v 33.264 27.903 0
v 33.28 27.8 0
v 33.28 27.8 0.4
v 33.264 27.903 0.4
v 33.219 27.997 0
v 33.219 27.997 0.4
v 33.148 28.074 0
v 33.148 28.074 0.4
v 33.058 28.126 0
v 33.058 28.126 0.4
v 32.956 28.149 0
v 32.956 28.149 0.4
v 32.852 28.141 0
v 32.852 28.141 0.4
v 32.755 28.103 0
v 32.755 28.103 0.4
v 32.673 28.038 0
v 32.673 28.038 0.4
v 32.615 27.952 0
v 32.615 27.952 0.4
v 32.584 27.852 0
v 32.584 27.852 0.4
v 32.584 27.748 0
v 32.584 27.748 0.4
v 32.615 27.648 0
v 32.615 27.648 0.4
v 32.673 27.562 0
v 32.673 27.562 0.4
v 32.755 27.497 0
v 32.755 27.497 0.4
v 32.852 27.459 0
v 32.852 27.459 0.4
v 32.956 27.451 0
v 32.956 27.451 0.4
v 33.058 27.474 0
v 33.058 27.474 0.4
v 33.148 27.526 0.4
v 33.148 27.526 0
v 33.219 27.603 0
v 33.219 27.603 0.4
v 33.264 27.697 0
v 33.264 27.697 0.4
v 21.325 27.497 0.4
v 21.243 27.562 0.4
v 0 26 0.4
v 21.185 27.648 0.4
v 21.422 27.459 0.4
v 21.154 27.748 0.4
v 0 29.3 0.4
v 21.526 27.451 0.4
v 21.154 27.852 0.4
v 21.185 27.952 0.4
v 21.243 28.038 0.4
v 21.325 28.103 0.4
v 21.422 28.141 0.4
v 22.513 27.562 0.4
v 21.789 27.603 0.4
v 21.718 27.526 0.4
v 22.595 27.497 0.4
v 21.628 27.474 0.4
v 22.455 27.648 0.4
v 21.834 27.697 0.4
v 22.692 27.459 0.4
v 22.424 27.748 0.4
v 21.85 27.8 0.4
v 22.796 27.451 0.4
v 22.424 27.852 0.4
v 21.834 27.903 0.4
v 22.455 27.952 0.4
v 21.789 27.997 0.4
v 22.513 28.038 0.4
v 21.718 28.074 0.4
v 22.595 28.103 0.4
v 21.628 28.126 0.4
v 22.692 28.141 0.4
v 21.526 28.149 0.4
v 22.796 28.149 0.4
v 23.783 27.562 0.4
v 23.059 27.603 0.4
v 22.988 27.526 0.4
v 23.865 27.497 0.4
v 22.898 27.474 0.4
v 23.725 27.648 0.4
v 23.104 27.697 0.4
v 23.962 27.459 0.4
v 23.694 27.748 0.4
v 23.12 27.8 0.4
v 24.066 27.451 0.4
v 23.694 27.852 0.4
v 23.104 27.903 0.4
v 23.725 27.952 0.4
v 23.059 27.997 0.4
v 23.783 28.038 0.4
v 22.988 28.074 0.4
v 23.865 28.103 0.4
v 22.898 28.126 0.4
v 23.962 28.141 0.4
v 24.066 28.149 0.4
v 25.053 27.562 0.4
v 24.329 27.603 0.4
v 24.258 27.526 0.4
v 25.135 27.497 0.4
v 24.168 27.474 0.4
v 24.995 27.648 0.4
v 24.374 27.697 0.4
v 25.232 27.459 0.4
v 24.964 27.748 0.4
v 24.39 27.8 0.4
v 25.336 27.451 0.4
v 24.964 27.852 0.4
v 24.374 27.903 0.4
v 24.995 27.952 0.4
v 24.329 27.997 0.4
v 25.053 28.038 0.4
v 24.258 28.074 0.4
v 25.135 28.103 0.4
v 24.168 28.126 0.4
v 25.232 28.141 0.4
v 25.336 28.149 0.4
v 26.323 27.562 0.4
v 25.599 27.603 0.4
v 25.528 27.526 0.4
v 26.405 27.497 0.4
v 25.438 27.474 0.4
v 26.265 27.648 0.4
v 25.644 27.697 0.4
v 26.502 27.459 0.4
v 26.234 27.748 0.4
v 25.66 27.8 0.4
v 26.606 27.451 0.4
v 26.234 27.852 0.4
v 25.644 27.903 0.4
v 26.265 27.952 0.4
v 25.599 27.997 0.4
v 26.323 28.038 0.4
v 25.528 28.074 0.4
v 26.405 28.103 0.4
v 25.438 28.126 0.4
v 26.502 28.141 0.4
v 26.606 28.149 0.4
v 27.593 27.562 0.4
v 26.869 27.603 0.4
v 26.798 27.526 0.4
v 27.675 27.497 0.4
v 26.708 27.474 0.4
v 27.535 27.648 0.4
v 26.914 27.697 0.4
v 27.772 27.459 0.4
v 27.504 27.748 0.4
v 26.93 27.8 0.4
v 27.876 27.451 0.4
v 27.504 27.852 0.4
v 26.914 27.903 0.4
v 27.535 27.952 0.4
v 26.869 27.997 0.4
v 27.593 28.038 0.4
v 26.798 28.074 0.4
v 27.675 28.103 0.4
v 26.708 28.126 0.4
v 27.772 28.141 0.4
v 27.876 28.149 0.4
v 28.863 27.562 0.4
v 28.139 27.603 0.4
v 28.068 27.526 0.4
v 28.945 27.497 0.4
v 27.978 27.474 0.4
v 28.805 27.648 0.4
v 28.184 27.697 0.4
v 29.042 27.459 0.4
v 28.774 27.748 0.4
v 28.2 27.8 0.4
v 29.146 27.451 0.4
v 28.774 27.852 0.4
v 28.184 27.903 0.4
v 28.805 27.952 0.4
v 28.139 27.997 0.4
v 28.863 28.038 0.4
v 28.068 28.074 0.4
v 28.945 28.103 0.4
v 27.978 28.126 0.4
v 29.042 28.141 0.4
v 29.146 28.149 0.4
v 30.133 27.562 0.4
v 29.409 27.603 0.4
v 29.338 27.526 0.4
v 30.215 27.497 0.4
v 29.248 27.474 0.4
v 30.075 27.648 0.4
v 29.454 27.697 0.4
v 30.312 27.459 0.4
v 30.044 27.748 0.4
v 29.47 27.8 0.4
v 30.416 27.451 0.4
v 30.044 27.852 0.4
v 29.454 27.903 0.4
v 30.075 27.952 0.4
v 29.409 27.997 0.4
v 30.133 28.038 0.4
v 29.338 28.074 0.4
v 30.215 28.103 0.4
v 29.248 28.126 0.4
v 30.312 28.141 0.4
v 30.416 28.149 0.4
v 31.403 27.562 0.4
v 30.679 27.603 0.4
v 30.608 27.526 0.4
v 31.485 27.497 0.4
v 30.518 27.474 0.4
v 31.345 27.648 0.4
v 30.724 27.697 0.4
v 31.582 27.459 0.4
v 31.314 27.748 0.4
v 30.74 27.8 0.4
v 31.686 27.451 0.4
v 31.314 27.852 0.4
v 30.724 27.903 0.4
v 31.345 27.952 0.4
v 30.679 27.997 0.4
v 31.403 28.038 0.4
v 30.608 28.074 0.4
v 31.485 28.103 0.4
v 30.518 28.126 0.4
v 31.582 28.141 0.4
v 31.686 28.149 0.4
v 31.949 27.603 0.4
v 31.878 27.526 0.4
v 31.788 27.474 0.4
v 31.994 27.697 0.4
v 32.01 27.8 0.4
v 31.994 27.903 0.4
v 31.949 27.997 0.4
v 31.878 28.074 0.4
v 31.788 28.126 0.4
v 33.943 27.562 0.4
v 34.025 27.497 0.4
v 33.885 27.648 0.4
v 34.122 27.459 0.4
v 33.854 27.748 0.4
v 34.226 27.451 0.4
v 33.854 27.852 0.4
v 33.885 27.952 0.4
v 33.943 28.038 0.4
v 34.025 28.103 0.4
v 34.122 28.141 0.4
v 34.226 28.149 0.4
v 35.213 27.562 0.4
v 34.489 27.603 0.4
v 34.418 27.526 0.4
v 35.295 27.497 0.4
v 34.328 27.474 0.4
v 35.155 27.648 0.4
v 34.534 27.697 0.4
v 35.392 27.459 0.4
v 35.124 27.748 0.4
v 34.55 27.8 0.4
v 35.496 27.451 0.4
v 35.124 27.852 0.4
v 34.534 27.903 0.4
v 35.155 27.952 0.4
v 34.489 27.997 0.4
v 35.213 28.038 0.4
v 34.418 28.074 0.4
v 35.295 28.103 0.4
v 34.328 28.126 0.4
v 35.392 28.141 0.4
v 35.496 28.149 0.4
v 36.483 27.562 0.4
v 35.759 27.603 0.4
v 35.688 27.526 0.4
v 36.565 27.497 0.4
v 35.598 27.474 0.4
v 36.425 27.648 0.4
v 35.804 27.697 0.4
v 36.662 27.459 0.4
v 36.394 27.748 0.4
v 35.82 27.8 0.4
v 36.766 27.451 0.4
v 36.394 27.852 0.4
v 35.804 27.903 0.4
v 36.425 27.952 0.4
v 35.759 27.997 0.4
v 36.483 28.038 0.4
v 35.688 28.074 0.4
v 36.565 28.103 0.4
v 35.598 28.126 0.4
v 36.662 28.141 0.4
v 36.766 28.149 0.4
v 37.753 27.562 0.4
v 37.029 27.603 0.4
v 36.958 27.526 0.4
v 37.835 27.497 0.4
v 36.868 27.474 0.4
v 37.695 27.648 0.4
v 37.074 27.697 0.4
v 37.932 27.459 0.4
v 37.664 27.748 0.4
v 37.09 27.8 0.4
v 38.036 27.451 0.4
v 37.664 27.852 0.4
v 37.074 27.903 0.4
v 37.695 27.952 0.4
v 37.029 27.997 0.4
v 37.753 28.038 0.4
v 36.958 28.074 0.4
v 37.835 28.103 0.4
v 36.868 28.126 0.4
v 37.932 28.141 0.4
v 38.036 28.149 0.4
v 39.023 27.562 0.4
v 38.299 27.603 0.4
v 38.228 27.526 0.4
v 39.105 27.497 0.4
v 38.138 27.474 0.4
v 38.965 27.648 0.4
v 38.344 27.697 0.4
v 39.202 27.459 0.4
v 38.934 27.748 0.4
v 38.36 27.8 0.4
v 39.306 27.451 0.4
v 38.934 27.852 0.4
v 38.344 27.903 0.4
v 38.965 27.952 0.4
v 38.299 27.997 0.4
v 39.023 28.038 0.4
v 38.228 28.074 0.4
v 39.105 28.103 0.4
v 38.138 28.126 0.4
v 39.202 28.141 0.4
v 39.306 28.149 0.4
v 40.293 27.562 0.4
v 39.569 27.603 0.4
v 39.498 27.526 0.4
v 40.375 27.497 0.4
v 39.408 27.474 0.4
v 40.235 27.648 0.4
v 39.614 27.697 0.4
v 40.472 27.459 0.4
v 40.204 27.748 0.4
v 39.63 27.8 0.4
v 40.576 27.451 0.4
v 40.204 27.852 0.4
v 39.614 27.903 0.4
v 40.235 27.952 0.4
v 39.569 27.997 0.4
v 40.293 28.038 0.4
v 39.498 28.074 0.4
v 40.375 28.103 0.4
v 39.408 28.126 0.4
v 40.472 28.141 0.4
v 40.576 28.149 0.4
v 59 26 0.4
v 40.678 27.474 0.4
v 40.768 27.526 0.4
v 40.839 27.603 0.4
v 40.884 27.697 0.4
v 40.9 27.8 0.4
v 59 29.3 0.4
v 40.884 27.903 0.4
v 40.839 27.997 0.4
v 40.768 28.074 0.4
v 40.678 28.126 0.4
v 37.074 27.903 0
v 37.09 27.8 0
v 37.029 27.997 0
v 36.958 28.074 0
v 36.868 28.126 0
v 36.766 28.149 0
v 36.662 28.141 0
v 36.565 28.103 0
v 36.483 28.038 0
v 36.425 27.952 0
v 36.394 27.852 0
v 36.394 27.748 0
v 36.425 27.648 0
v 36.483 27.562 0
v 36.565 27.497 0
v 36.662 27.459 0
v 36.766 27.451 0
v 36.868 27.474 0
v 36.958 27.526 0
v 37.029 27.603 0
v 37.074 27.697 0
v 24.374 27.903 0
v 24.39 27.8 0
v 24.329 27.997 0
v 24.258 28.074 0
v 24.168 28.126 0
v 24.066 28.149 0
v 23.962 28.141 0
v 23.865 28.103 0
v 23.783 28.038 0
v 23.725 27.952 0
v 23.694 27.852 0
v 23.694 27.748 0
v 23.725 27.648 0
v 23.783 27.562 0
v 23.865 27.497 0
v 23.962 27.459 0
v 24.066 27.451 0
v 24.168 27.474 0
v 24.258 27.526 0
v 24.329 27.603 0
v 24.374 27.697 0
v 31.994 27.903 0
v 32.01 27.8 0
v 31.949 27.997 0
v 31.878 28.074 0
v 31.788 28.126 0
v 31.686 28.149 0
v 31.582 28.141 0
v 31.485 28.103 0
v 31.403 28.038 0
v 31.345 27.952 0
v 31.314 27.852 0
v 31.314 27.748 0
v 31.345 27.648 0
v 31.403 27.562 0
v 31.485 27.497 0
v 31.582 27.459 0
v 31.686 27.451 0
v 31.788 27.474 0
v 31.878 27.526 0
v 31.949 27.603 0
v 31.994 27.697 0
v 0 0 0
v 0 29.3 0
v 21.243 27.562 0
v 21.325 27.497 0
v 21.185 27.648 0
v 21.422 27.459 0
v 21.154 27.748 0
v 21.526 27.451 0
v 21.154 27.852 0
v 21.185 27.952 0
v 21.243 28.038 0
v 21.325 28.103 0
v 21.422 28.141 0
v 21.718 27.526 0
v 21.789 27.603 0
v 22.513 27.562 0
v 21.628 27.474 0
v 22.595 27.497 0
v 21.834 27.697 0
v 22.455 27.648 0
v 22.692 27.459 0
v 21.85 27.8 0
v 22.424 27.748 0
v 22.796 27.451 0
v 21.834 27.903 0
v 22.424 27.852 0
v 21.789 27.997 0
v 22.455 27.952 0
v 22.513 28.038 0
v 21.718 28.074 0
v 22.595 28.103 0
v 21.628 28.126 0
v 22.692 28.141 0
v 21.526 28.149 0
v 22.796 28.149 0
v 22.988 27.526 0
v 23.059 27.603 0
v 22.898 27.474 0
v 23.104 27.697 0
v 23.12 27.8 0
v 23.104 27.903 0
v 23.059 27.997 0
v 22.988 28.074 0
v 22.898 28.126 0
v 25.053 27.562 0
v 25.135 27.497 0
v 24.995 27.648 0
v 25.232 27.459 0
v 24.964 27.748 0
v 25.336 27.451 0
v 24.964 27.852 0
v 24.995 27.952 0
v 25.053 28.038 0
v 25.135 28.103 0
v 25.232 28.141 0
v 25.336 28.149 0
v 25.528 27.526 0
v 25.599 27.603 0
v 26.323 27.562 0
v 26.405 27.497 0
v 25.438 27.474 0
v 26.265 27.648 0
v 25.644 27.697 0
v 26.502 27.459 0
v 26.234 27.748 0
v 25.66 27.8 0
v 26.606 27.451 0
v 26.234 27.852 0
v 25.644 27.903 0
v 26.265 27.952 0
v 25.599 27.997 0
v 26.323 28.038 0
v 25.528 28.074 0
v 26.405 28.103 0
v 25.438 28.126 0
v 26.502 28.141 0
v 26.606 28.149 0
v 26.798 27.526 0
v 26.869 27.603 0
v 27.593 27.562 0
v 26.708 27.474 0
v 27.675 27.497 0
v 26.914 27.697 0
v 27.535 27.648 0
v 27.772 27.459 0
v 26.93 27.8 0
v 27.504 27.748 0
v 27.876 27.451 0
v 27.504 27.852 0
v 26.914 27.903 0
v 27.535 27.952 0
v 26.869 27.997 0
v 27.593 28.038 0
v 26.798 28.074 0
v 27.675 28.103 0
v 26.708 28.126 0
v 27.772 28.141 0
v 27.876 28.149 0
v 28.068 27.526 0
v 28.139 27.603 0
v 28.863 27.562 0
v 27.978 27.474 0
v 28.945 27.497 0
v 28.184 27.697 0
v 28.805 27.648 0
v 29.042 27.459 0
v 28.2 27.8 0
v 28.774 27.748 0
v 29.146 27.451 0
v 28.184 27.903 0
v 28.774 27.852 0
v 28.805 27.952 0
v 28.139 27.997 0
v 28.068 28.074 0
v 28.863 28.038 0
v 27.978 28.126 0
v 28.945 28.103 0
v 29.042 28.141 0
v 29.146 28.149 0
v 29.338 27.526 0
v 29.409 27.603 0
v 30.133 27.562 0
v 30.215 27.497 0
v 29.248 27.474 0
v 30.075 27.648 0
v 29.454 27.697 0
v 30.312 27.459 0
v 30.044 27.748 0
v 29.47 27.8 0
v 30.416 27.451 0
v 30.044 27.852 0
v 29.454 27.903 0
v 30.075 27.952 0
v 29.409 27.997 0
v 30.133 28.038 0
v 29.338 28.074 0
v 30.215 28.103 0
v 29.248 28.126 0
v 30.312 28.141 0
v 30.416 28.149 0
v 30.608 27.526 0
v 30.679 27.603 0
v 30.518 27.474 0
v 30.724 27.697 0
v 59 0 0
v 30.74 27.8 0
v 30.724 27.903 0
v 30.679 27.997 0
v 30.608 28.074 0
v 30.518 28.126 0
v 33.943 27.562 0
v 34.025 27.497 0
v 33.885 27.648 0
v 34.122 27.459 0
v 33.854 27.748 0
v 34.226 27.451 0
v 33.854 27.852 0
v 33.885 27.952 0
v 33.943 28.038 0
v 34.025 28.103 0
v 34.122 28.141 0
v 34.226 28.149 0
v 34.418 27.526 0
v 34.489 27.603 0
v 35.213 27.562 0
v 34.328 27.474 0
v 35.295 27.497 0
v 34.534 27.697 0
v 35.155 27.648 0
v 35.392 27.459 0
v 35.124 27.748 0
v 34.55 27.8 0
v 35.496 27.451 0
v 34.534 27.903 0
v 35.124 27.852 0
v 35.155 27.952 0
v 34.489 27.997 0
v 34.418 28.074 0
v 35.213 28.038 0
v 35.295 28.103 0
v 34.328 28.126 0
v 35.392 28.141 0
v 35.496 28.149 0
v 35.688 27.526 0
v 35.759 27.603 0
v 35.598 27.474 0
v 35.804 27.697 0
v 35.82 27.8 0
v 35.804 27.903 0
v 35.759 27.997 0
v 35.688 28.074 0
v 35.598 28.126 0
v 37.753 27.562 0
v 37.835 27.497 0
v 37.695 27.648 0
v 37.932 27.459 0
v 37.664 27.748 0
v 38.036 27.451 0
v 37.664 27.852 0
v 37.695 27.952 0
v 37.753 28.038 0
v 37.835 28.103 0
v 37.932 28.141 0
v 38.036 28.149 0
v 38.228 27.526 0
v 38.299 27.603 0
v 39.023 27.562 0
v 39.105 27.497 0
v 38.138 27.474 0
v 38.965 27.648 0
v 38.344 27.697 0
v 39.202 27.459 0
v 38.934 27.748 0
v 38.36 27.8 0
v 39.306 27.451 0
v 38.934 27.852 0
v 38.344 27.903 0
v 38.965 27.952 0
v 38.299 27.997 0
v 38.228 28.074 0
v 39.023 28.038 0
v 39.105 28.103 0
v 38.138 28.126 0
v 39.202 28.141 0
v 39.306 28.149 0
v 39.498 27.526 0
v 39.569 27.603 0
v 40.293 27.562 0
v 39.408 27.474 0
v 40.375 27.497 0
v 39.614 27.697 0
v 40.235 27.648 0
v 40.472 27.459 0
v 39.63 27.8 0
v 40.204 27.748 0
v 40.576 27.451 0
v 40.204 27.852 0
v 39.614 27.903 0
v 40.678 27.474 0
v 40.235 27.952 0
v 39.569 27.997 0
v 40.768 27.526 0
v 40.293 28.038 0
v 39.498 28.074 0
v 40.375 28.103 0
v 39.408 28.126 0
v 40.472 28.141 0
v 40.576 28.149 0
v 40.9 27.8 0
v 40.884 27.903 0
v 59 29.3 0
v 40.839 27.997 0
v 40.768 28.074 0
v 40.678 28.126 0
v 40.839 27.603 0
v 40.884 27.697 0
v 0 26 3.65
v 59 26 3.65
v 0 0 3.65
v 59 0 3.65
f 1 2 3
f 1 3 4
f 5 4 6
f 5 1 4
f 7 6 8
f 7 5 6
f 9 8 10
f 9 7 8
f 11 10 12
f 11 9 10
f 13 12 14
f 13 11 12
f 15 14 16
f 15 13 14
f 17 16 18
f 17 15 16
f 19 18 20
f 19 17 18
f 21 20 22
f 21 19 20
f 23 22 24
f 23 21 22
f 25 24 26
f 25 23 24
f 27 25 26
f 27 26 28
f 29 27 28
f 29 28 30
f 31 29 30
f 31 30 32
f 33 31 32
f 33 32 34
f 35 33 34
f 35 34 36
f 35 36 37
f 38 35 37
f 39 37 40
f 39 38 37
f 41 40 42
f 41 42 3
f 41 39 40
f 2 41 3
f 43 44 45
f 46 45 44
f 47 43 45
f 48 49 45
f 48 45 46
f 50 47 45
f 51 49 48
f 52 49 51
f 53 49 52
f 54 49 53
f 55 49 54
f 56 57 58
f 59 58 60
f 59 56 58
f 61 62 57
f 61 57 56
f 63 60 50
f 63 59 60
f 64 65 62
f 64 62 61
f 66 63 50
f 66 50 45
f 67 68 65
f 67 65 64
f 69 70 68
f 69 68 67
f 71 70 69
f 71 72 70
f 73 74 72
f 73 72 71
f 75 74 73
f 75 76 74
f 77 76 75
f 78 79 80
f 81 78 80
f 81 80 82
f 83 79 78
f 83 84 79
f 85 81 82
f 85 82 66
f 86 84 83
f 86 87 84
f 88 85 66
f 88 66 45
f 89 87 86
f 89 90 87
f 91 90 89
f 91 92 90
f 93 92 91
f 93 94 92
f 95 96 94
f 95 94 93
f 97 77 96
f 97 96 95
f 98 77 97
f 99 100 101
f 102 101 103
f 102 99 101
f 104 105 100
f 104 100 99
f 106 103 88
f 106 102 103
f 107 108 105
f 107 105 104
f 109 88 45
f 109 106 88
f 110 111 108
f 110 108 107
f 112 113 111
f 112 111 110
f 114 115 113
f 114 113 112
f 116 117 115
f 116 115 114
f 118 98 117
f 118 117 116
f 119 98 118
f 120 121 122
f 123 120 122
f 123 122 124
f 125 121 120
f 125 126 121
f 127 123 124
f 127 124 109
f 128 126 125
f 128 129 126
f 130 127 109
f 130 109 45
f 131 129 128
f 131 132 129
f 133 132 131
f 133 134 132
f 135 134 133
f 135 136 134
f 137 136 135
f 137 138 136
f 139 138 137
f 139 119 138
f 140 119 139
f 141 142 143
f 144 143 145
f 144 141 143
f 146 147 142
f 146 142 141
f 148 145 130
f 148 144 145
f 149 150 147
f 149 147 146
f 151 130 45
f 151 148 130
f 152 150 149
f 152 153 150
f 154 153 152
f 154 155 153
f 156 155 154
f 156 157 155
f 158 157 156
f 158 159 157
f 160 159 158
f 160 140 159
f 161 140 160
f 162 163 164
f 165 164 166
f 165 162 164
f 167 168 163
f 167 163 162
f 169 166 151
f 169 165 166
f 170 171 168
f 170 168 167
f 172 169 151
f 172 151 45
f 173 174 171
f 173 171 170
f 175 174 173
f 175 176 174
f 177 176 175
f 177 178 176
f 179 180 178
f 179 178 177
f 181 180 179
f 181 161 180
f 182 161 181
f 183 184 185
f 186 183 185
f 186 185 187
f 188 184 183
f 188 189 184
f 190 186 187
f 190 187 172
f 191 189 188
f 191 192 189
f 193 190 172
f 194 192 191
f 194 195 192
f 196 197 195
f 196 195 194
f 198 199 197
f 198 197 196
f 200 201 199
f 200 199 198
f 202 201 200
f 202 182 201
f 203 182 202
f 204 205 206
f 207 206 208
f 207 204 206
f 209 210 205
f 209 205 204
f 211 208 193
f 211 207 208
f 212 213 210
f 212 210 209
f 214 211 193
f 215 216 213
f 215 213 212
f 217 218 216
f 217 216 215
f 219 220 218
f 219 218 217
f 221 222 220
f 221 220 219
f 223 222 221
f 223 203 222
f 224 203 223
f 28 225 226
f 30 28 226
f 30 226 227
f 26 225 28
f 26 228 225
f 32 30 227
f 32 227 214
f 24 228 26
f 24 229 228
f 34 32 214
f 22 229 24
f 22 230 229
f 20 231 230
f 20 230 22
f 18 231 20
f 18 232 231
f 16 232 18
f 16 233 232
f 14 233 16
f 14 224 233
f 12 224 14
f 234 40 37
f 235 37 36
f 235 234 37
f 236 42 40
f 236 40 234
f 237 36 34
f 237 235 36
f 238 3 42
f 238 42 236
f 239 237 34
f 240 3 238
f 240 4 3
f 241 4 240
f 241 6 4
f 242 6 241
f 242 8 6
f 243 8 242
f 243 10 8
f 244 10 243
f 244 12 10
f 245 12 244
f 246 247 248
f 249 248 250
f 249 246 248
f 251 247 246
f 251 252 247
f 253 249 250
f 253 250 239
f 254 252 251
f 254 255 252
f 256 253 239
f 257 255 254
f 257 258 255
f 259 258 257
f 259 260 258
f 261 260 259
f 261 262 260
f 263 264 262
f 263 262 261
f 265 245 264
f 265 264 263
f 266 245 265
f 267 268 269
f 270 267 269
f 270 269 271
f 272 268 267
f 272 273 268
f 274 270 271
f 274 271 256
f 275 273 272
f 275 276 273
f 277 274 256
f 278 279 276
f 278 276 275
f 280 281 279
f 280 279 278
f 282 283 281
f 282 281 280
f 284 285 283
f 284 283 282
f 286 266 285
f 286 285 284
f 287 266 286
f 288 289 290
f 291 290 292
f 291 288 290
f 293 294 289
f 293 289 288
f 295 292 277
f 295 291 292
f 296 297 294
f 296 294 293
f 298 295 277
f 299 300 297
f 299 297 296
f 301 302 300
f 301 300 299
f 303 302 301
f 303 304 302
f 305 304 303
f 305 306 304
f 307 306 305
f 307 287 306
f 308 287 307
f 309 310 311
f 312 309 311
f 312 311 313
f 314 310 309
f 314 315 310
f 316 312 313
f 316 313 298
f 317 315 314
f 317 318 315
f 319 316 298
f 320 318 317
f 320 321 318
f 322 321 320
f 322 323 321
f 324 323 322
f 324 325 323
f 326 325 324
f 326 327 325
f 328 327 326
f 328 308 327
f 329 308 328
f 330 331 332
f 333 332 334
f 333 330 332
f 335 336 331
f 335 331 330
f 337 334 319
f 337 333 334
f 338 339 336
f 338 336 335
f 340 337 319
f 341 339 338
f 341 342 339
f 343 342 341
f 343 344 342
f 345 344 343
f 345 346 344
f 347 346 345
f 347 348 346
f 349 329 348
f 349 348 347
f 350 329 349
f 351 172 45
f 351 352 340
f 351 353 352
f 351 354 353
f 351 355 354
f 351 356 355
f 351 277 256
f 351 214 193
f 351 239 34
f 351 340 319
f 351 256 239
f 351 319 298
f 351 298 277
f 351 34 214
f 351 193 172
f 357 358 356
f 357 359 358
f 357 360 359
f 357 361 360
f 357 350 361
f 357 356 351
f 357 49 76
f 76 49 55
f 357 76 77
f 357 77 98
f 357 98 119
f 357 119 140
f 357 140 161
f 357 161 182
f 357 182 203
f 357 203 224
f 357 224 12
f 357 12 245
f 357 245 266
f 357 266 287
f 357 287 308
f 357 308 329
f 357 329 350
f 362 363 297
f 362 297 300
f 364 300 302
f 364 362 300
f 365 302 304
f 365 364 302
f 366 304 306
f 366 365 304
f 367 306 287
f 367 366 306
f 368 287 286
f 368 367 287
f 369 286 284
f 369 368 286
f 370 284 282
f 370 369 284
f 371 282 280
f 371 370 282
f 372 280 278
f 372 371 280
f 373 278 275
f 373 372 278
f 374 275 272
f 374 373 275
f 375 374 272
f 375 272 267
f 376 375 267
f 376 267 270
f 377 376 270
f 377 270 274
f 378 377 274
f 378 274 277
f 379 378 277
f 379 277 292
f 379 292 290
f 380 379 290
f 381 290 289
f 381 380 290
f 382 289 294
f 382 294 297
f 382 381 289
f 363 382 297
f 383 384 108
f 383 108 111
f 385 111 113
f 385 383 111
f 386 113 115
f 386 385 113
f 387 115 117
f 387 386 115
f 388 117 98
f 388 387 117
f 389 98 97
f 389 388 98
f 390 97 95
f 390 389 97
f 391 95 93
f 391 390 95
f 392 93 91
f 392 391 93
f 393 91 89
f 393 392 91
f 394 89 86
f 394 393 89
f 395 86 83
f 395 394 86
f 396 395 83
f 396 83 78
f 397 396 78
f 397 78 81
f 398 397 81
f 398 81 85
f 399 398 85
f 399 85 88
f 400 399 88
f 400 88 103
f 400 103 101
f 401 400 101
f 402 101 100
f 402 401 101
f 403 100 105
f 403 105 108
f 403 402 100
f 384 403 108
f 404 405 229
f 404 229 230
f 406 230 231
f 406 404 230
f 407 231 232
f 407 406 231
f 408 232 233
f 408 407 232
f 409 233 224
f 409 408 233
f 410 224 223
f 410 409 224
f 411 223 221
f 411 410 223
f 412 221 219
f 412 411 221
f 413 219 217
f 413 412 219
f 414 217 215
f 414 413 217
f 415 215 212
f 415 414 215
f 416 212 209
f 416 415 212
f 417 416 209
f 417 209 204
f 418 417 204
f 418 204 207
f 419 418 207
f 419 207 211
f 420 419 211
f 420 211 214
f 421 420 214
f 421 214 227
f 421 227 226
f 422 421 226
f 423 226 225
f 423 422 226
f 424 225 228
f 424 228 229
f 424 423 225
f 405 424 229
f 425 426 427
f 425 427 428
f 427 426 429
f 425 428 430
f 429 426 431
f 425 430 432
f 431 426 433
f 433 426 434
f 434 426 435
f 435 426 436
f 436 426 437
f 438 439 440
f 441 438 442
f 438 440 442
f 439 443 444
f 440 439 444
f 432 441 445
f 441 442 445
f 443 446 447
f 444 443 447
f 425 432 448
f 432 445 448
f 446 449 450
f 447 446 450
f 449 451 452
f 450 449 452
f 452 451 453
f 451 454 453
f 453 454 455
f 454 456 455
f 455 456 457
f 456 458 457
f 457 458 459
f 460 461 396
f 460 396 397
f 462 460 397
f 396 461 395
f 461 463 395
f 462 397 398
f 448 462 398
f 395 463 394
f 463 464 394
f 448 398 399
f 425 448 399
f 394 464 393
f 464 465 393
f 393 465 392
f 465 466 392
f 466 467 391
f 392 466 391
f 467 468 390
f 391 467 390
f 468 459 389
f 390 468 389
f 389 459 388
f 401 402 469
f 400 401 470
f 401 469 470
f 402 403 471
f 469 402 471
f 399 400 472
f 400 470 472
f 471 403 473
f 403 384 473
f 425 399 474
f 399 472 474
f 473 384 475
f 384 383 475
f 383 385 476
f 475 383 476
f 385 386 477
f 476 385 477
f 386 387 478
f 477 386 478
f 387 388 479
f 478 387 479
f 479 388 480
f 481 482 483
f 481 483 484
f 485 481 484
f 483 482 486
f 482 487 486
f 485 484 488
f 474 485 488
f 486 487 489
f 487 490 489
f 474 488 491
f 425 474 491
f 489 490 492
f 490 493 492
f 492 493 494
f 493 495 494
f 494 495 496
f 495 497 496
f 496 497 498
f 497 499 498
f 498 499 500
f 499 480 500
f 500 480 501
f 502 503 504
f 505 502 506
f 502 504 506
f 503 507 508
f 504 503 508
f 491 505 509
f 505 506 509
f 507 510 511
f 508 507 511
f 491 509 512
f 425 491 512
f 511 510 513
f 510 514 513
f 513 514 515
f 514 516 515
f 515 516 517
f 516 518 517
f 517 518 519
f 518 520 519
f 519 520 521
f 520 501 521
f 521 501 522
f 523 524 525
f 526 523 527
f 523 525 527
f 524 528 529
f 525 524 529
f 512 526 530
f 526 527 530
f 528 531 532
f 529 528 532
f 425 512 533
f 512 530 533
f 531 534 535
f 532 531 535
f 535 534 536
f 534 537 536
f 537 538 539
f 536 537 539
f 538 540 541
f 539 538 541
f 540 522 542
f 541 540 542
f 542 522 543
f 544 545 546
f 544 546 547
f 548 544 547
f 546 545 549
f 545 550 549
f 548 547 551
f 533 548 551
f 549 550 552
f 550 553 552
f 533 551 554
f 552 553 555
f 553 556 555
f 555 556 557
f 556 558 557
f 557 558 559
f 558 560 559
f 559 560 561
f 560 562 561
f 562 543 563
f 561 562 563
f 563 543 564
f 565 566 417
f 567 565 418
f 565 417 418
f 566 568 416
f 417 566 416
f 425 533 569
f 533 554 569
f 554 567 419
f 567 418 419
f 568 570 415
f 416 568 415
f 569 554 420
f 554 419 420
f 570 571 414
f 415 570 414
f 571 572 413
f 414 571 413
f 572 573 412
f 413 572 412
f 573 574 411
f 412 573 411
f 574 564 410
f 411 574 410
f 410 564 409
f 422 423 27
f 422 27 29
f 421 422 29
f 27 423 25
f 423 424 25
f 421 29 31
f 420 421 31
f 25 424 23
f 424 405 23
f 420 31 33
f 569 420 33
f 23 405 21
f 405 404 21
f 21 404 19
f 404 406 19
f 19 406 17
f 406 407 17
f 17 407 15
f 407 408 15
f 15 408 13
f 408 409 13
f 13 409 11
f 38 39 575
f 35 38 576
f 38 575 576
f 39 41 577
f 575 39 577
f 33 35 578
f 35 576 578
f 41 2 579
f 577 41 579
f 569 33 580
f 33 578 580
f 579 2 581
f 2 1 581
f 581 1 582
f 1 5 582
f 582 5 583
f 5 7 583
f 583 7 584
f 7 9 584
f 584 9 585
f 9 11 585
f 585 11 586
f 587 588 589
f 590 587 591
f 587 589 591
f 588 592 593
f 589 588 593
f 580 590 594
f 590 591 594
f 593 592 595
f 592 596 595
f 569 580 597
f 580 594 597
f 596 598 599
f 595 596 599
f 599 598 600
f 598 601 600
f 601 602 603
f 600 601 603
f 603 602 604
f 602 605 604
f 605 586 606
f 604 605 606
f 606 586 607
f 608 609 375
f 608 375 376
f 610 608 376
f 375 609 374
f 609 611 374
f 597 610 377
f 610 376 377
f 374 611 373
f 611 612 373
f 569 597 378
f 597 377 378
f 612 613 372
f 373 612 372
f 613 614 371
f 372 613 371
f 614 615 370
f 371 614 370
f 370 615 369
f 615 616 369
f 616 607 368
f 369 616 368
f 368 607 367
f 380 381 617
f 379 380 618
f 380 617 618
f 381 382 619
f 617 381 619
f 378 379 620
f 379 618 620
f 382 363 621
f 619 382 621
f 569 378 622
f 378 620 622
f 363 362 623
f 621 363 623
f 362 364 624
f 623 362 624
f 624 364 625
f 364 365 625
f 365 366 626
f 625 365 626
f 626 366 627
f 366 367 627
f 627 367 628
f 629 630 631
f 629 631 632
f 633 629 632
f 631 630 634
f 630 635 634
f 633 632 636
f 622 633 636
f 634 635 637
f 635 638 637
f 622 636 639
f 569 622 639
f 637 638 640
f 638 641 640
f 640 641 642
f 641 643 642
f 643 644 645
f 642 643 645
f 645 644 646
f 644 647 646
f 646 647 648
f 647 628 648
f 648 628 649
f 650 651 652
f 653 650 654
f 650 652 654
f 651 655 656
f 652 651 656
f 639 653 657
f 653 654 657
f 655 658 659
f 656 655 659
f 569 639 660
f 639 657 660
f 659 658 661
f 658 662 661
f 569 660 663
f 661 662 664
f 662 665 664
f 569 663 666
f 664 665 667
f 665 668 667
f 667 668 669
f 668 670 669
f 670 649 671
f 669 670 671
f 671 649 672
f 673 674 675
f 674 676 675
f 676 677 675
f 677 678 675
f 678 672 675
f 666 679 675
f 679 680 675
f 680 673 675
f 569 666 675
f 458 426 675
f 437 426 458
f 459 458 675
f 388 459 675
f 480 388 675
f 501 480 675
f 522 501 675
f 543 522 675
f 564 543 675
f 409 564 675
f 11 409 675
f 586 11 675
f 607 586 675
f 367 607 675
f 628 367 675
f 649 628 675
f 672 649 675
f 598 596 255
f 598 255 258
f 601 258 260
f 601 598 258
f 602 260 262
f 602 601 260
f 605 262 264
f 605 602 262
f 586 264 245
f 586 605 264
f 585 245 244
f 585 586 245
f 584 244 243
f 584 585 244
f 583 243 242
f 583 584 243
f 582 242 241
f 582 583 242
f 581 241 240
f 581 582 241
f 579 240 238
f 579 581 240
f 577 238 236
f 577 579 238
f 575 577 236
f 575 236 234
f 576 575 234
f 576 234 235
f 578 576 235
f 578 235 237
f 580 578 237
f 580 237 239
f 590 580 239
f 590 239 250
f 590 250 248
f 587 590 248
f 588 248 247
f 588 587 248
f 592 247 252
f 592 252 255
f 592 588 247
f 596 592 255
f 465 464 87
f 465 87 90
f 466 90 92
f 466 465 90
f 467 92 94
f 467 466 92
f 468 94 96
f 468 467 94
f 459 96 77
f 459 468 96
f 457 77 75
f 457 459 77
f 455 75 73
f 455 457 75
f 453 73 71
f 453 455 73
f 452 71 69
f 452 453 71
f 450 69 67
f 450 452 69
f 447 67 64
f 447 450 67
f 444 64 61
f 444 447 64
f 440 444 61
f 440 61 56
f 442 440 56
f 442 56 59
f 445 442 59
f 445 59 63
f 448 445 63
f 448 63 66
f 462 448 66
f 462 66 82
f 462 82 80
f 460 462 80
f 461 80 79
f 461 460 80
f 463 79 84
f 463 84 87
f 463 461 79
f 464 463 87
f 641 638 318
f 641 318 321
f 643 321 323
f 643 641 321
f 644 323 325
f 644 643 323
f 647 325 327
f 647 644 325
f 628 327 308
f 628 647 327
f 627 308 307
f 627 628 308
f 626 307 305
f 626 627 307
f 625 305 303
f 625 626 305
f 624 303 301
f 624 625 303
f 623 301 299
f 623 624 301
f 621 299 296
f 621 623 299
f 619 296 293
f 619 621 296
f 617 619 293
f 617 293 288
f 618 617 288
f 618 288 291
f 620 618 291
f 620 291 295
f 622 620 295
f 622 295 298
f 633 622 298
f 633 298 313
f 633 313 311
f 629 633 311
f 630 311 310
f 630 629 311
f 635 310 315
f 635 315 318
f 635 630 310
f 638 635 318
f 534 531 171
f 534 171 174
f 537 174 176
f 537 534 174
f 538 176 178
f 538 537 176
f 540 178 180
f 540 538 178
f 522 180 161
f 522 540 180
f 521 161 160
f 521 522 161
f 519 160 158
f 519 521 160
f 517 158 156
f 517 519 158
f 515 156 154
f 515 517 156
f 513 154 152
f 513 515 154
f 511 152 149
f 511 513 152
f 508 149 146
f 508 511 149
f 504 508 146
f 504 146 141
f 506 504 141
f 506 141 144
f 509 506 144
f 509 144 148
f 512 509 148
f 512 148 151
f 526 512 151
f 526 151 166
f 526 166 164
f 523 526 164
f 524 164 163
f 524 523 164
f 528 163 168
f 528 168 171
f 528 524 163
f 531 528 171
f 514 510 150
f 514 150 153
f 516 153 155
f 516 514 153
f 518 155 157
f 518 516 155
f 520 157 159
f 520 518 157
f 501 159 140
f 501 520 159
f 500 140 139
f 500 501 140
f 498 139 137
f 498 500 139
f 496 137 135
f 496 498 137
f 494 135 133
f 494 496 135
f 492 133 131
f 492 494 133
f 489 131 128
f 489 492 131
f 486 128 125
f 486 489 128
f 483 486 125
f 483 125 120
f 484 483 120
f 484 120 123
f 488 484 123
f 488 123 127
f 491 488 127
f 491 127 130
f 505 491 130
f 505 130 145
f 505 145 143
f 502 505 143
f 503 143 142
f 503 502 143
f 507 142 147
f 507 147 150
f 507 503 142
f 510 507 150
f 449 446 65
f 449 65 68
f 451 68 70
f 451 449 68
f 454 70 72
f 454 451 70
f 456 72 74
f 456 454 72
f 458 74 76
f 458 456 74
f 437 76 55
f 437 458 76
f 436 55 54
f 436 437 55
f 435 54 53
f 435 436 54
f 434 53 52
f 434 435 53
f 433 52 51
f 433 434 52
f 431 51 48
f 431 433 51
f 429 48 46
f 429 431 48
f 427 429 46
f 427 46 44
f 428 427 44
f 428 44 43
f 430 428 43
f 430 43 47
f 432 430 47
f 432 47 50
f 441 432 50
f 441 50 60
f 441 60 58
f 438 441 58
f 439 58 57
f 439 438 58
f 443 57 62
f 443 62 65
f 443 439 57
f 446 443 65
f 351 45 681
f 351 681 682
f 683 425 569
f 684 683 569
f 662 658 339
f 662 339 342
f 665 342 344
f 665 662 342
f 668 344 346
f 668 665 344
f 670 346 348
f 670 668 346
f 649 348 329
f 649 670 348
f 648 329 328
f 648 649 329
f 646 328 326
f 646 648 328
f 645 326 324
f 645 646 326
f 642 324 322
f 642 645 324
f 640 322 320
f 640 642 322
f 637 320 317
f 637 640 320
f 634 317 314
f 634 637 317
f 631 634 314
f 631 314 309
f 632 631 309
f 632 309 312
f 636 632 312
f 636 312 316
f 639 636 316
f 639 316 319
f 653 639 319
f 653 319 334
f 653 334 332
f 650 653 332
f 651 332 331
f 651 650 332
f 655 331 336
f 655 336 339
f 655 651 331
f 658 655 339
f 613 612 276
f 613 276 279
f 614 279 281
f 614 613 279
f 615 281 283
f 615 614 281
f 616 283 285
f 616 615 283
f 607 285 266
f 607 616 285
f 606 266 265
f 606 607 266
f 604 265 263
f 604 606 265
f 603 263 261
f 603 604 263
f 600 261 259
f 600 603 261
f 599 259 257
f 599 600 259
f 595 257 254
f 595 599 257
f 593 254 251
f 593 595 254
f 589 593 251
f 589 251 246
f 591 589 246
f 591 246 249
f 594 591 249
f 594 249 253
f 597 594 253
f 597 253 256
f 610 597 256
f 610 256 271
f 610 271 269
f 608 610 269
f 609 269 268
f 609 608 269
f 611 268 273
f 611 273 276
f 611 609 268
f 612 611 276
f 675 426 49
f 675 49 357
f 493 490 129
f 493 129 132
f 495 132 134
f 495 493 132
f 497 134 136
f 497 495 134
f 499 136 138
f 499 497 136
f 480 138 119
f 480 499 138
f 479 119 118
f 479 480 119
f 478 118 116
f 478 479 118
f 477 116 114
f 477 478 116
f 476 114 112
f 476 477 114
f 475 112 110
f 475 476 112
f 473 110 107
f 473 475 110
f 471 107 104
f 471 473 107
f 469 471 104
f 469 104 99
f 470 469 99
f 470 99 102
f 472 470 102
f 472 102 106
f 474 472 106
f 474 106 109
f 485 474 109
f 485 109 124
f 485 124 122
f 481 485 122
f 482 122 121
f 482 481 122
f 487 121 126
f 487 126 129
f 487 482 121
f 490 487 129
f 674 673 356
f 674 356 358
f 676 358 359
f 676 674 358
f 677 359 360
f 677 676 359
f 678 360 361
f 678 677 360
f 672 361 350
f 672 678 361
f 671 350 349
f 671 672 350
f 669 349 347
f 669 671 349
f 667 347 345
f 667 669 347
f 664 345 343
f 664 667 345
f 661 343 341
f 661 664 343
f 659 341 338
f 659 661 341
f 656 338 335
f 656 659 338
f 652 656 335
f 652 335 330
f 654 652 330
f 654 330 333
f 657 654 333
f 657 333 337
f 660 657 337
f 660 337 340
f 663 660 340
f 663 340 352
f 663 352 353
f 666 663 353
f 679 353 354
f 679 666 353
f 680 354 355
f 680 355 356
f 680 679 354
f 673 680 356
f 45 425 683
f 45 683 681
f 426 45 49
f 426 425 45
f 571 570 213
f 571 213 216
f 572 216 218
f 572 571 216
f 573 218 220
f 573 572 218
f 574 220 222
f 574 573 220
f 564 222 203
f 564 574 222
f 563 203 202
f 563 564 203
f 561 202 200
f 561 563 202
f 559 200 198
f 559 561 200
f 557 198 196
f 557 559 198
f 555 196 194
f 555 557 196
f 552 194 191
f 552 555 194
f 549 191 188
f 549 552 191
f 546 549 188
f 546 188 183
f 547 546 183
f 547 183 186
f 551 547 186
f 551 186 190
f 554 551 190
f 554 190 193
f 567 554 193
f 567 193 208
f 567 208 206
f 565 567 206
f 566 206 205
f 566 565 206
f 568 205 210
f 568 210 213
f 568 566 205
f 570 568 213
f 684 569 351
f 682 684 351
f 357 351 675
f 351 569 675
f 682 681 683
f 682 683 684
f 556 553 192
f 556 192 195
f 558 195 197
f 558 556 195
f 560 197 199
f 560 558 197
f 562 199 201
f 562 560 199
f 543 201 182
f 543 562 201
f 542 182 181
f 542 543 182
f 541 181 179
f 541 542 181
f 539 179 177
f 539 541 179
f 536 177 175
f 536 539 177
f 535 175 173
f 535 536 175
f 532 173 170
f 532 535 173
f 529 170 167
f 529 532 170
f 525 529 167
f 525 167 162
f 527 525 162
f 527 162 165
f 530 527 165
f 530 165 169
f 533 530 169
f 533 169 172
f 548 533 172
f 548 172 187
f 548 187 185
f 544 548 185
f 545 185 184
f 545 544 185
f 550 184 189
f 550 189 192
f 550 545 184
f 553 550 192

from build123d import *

# Parameters (mm, degrees)
BOX004_W       = 52
BOX004_H       = 15
BOX004_DEPTH   = 3.25
BOX003_W       = 56.3
BOX003_H       = 19.4
BOX003_DEPTH   = 3.25
BOX005_W       = 52
BOX005_H       = 15
BOX005_DEPTH   = 3.25
CYLINDER_R     = 0.35
CYLINDER_DEPTH = 0.4
ARRAY_X_COUNT  = 16
ARRAY_X_PITCH  = 1.27
BOX_W          = 59
BOX_H          = 29.3
BOX_DEPTH      = 0.4
BOX002_W       = 56.3
BOX002_H       = 19.4
BOX002_DEPTH   = 3.25
BOX001_W       = 59
BOX001_H       = 26
BOX001_DEPTH   = 3.25


with BuildPart() as box004:
    # Box004 → Box004 (new body)
    with BuildSketch(Plane(origin=(3.5, 6.3, 0.4), x_dir=(1, 0, 0), z_dir=(0, 0, 1))):
        with Locations((26, 7.5)):
            Rectangle(BOX004_W, BOX004_H)
    extrude(amount=BOX004_DEPTH)


with BuildPart() as cut001:
    # Box003 → Box003 (new body)
    with BuildSketch(Plane(origin=(1.35, 4.1, 0.4), x_dir=(1, 0, 0), z_dir=(0, 0, 1))):
        with Locations((28.15, 9.7)):
            Rectangle(BOX003_W, BOX003_H)
    extrude(amount=BOX003_DEPTH)

    # Cut001: cut Box004
    add(box004.part, mode=Mode.SUBTRACT)


with BuildPart() as box005:
    # Box005 → Box005 (new body)
    with BuildSketch(Plane(origin=(3.5, 6.3, 0.4), x_dir=(1, 0, 0), z_dir=(0, 0, 1))):
        with Locations((26, 7.5)):
            Rectangle(BOX005_W, BOX005_H)
    extrude(amount=BOX005_DEPTH)


with BuildPart() as array:
    # Cylinder → Cylinder (new body)
    with BuildSketch(Plane(origin=(21.5, 27.8, 0), x_dir=(1, 0, 0), z_dir=(0, 0, 1))):
        Circle(CYLINDER_R)
    extrude(amount=CYLINDER_DEPTH)

    # Array X: Array ×16


with BuildPart() as array_1:
    add(array.part)
    with Locations(*[(i * ARRAY_X_PITCH, 0, 0) for i in range(1, ARRAY_X_COUNT)]):
        add(array.part)


with BuildPart() as cut002:
    # Box → Box (new body)
    with BuildSketch(Plane.XY):
        with Locations((29.5, 14.65)):
            Rectangle(BOX_W, BOX_H)
    extrude(amount=BOX_DEPTH)

    # Cut002: cut Array
    add(array_1.part, mode=Mode.SUBTRACT)


with BuildPart() as box002:
    # Box002 → Box002 (new body)
    with BuildSketch(Plane(origin=(1.35, 4.1, 0.4), x_dir=(1, 0, 0), z_dir=(0, 0, 1))):
        with Locations((28.15, 9.7)):
            Rectangle(BOX002_W, BOX002_H)
    extrude(amount=BOX002_DEPTH)


with BuildPart() as fusion:
    # Box001 → Box001 (new body)
    with BuildSketch(Plane.XY.offset(0.4)):
        with Locations((29.5, 13)):
            Rectangle(BOX001_W, BOX001_H)
    extrude(amount=BOX001_DEPTH)

    # Cut: cut Box002
    add(box002.part, mode=Mode.SUBTRACT)

    # Fusion: union Cut001, box005, Cut002
    add(cut001.part)
    add(box005.part)
    add(cut002.part)


solid = fusion.part
